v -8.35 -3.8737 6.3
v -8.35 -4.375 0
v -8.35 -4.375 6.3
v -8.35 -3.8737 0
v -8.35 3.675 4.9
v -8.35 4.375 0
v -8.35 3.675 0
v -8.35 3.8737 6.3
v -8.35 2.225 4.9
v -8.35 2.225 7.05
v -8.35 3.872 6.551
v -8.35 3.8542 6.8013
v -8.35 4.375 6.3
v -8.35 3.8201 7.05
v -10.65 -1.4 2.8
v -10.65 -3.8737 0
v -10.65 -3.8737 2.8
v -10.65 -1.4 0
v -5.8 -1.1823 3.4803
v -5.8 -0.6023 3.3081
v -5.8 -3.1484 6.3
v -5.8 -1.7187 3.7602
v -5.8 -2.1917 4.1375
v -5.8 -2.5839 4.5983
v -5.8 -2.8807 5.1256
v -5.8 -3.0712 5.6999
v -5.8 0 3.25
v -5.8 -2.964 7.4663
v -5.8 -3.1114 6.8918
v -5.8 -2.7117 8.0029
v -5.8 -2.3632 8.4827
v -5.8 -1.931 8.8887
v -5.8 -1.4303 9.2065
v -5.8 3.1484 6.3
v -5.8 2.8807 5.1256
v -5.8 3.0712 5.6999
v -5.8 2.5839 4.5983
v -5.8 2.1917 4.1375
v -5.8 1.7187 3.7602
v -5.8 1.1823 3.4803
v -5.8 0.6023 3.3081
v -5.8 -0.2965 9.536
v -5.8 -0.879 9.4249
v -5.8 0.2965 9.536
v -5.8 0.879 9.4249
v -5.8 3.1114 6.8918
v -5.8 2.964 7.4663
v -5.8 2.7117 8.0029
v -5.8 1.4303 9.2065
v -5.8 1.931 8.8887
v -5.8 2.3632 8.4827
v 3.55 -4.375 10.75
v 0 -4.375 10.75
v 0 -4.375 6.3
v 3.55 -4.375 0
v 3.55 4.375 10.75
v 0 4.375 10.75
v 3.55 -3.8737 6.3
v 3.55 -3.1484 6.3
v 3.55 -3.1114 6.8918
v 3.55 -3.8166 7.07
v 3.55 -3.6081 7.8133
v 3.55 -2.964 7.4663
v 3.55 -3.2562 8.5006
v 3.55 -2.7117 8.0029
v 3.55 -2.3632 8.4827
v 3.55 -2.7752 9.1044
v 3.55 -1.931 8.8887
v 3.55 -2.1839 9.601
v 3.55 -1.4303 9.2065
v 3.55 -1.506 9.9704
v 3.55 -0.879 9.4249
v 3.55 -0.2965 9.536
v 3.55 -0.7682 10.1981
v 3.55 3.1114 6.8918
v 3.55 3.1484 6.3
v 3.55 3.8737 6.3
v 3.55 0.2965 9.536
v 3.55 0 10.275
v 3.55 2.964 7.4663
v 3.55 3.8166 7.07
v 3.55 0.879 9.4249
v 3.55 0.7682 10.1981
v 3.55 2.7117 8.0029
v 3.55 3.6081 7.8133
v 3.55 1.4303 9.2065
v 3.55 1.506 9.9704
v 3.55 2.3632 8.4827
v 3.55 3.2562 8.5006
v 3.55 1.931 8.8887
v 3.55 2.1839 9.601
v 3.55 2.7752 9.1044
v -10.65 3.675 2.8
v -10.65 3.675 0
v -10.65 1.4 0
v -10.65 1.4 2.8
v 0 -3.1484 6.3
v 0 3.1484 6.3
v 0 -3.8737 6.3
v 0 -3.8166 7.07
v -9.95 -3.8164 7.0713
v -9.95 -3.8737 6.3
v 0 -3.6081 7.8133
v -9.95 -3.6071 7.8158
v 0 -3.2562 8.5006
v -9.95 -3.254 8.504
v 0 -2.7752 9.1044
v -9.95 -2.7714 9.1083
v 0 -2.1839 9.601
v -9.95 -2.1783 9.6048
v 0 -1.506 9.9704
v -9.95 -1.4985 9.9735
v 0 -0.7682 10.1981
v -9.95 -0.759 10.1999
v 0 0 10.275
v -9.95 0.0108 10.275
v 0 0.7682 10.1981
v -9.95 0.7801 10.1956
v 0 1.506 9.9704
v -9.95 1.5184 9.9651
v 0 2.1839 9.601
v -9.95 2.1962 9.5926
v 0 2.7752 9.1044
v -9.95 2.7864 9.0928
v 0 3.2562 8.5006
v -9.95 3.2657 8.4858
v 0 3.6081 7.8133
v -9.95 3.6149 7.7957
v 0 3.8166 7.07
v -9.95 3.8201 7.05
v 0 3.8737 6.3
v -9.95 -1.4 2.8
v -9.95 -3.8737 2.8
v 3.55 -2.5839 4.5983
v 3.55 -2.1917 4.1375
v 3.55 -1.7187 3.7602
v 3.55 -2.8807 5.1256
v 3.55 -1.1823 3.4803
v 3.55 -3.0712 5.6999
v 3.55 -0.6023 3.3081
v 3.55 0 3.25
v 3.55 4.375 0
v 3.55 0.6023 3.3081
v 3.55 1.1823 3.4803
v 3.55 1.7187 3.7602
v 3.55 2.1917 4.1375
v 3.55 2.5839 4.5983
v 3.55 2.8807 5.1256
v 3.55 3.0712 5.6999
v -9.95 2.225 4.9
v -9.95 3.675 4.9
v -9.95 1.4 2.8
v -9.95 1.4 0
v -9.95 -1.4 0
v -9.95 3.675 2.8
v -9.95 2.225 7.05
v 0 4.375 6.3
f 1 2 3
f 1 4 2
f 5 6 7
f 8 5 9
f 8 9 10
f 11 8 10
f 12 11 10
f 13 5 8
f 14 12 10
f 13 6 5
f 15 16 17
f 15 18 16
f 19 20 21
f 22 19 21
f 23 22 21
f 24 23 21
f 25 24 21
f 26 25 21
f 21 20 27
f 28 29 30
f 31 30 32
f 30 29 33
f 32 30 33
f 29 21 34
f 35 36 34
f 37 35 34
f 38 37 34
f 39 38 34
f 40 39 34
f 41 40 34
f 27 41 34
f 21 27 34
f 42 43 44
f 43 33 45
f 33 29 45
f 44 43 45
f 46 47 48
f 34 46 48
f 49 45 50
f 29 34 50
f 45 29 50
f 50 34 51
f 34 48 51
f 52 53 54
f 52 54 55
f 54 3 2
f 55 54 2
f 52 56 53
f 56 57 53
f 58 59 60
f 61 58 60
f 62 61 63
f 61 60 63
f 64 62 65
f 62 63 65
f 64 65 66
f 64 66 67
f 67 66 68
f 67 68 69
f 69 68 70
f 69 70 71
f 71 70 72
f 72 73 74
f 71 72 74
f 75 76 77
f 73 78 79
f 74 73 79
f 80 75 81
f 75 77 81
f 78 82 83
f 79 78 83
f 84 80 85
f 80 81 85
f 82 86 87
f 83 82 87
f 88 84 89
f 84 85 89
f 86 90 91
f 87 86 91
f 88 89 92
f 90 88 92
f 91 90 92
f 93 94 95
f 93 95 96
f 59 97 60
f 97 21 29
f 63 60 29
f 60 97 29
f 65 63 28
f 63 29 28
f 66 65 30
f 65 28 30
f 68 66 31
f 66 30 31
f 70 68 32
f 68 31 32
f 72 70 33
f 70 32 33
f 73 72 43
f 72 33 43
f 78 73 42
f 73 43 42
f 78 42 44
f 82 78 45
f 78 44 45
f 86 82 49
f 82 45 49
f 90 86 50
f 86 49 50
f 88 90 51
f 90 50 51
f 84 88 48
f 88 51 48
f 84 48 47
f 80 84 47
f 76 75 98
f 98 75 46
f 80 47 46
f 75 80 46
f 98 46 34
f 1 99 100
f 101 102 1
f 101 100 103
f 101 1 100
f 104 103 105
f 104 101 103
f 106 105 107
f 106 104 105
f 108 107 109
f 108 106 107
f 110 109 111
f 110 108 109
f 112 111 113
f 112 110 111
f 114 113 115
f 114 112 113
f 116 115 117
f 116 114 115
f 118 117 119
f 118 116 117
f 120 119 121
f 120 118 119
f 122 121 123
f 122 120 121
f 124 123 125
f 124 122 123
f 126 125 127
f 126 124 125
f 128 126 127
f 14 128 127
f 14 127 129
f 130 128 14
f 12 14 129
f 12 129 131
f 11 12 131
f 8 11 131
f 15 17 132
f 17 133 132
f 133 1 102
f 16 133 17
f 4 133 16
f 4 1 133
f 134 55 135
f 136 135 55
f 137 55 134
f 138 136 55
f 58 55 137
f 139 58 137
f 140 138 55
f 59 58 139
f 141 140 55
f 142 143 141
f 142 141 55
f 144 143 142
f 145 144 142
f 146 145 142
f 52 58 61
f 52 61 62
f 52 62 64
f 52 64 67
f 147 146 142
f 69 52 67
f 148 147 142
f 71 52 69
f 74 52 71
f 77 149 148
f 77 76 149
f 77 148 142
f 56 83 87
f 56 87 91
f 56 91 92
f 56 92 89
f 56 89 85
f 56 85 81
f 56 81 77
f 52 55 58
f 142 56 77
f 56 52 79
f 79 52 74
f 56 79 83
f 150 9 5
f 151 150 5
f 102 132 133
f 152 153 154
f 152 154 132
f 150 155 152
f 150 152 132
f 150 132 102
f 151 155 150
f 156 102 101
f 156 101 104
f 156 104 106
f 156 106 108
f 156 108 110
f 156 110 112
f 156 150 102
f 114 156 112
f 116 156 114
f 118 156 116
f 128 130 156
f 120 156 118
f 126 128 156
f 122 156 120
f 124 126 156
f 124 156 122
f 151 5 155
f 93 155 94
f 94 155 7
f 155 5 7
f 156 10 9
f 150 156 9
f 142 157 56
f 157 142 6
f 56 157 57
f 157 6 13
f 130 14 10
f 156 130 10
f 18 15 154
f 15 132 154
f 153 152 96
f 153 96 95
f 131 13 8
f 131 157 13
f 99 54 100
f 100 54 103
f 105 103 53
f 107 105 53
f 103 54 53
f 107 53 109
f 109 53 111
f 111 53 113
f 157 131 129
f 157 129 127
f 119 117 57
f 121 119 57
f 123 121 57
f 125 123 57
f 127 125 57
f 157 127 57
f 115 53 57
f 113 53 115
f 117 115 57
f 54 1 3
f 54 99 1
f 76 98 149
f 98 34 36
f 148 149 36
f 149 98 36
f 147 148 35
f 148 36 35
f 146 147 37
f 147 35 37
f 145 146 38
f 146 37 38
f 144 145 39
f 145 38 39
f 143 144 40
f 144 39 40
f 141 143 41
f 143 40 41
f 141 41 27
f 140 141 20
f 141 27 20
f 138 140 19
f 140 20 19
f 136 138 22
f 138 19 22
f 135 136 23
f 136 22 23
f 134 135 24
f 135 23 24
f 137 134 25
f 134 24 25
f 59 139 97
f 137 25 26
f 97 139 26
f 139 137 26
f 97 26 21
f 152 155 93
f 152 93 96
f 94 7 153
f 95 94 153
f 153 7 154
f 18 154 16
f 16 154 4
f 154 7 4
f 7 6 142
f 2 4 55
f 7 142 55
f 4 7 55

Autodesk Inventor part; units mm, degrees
ref_plane "YZ Plane" through (0, 0, 0) normal (1, 0, 0) x (0, 1, 0)
ref_plane "XZ Plane" through (0, 0, 0) normal (0, 1, 0) x (-1, 0, 0)
ref_plane "XY Plane" through (0, 0, 0) normal (0, 0, 1) x (1, 0, 0)
sketch "Sketch1" plane through (0, 0, 0) normal (1, 0, 0) x (0, 1, 0)
  line L0 (-4.375, 0) -> (4.375, 0)
  line L1 (4.375, 0) -> (4.375, 10.75)
  line L2 (4.375, 10.75) -> (-4.375, 10.75)
  line L3 (-4.375, 10.75) -> (-4.375, 0)
  circle A0 centre (0, 6.4) radius 3.15
  point P0 (0, 0)
  point P1 (0, 10.75)
  dimension "d0" = 8.75
  dimension "d1" = 10.75
  dimension "d2" = 6.3
  dimension "d3" = 1.2
extrude "Extrusion1" add sketch "Sketch1" along normal blind 3.55
sketch "Sketch2" plane through (0, 0, 0) normal (-1, 0, 0) x (0, 0, 1)
  circle A0 centre (6.4, 0) radius 3.15 projected
  line L0 (0, -4.375) -> (0, 4.375) projected
  line L1 (10.75, -4.375) -> (0, -4.375) projected
  line L2 (0, 4.375) -> (10.75, 4.375) projected
  line L3 (6.3, 4.375) -> (6.3, 3.1484)
  line L4 (6.3, -3.1484) -> (6.3, -4.375)
  point P0 (0, 0)
  dimension "d7" = 6.3
extrude "Extrusion2" add sketch "Sketch2" along normal blind 8.35 contours A0 L4 L1 L0 L2 L3
sketch "Sketch3" plane through (-8.35, 0, 0) normal (-1, 0, 0) x (0, 0, 1)
  line L0 (6.3, -4.375) -> (6.3, -3.1484) projected
  arc A0 (6.3, 3.1484) -> (6.3, -3.1484) centre (6.4, 0) ccw projected
  line L1 (6.3, 3.1484) -> (6.3, 4.375) projected
  arc A1 (6.3, -3.8737) -> (6.3, 3.8737) centre (6.4, 0) ccw
  arc A2 (6.3, -3.1484) -> (6.3, 3.1484) centre (6.4, 0) ccw projected
  line L2 (6.3, 3.8737) -> (6.3, 3.1484)
  line L3 (6.3, -3.1484) -> (6.3, -3.8737)
  point P0 (0, 0)
  dimension "d10" = 3.875
extrude "Extrusion3" add sketch "Sketch3" against normal up to next contours L0 A2 L1 A1
sketch "Sketch4" plane through (-8.35, 0, 0) normal (-1, 0, 0) x (0, 0, 1)
  circle A0 centre (6.4, 0) radius 3.15 projected
  point P0 (0, 0)
extrude "Extrusion4" add sketch "Sketch4" against normal blind 2.55
sketch "Sketch5" plane through (-8.35, 0, 0) normal (-1, 0, 0) x (0, 0, 1)
  line L0 (6.3, 4.375) -> (0, 4.375) projected
  line L1 (0, 4.375) -> (0, -4.375) projected
  line L2 (6.3, -4.375) -> (6.3, -3.8737) projected
  arc A0 (6.3, -3.8737) -> (6.3, 3.8737) centre (6.4, 0) ccw projected
  line L3 (7.05, 3.8201) -> (7.05, 2.225)
  line L4 (7.05, 2.225) -> (4.9, 2.225)
  line L5 (4.9, 2.225) -> (4.9, 3.675)
  line L6 (4.9, 3.675) -> (0, 3.675)
  line L7 (6.3, -3.8737) -> (0, -3.8737)
  line L8 (0, 3.675) -> (0, -3.8737)
  arc A1 (6.3, -3.8737) -> (7.05, 3.8201) centre (6.4, 0) ccw
  point P0 (0, 0)
  dimension "d15" = 2.15
  dimension "d17" = 4.9
  dimension "d18" = 0.7
  dimension "d19" = 2.15
extrude "Extrusion5" add sketch "Sketch5" along normal blind 1.6
sketch "Sketch6" plane through (-9.95, 0, 0) normal (-1, 0, 0) x (0, 0, 1)
  line L0 (0, 3.675) -> (0, -3.8737) projected
  line L1 (0, 3.675) -> (2.8, 3.675)
  line L2 (2.8, 3.675) -> (2.8, 1.4)
  line L3 (2.8, 1.4) -> (0, 1.4)
  line L4 (0, 1.4) -> (0, 3.675)
  line L5 (0, -3.8737) -> (2.8, -3.8737)
  line L6 (2.8, -3.8737) -> (2.8, -1.4)
  line L7 (2.8, -1.4) -> (0, -1.4)
  line L8 (0, -1.4) -> (0, -3.8737)
  arc A0 (6.3, -3.8737) -> (7.05, 3.8201) centre (6.4, 0) ccw projected
  point P0 (0, 0)
  dimension "d25" = 2.8
  dimension "d28" = 1.4
  dimension "d29" = 1.4
extrude "Extrusion6" add sketch "Sketch6" along normal blind 0.7
equation "\"d29\" = d28"
properties material "ABS Plastic"
